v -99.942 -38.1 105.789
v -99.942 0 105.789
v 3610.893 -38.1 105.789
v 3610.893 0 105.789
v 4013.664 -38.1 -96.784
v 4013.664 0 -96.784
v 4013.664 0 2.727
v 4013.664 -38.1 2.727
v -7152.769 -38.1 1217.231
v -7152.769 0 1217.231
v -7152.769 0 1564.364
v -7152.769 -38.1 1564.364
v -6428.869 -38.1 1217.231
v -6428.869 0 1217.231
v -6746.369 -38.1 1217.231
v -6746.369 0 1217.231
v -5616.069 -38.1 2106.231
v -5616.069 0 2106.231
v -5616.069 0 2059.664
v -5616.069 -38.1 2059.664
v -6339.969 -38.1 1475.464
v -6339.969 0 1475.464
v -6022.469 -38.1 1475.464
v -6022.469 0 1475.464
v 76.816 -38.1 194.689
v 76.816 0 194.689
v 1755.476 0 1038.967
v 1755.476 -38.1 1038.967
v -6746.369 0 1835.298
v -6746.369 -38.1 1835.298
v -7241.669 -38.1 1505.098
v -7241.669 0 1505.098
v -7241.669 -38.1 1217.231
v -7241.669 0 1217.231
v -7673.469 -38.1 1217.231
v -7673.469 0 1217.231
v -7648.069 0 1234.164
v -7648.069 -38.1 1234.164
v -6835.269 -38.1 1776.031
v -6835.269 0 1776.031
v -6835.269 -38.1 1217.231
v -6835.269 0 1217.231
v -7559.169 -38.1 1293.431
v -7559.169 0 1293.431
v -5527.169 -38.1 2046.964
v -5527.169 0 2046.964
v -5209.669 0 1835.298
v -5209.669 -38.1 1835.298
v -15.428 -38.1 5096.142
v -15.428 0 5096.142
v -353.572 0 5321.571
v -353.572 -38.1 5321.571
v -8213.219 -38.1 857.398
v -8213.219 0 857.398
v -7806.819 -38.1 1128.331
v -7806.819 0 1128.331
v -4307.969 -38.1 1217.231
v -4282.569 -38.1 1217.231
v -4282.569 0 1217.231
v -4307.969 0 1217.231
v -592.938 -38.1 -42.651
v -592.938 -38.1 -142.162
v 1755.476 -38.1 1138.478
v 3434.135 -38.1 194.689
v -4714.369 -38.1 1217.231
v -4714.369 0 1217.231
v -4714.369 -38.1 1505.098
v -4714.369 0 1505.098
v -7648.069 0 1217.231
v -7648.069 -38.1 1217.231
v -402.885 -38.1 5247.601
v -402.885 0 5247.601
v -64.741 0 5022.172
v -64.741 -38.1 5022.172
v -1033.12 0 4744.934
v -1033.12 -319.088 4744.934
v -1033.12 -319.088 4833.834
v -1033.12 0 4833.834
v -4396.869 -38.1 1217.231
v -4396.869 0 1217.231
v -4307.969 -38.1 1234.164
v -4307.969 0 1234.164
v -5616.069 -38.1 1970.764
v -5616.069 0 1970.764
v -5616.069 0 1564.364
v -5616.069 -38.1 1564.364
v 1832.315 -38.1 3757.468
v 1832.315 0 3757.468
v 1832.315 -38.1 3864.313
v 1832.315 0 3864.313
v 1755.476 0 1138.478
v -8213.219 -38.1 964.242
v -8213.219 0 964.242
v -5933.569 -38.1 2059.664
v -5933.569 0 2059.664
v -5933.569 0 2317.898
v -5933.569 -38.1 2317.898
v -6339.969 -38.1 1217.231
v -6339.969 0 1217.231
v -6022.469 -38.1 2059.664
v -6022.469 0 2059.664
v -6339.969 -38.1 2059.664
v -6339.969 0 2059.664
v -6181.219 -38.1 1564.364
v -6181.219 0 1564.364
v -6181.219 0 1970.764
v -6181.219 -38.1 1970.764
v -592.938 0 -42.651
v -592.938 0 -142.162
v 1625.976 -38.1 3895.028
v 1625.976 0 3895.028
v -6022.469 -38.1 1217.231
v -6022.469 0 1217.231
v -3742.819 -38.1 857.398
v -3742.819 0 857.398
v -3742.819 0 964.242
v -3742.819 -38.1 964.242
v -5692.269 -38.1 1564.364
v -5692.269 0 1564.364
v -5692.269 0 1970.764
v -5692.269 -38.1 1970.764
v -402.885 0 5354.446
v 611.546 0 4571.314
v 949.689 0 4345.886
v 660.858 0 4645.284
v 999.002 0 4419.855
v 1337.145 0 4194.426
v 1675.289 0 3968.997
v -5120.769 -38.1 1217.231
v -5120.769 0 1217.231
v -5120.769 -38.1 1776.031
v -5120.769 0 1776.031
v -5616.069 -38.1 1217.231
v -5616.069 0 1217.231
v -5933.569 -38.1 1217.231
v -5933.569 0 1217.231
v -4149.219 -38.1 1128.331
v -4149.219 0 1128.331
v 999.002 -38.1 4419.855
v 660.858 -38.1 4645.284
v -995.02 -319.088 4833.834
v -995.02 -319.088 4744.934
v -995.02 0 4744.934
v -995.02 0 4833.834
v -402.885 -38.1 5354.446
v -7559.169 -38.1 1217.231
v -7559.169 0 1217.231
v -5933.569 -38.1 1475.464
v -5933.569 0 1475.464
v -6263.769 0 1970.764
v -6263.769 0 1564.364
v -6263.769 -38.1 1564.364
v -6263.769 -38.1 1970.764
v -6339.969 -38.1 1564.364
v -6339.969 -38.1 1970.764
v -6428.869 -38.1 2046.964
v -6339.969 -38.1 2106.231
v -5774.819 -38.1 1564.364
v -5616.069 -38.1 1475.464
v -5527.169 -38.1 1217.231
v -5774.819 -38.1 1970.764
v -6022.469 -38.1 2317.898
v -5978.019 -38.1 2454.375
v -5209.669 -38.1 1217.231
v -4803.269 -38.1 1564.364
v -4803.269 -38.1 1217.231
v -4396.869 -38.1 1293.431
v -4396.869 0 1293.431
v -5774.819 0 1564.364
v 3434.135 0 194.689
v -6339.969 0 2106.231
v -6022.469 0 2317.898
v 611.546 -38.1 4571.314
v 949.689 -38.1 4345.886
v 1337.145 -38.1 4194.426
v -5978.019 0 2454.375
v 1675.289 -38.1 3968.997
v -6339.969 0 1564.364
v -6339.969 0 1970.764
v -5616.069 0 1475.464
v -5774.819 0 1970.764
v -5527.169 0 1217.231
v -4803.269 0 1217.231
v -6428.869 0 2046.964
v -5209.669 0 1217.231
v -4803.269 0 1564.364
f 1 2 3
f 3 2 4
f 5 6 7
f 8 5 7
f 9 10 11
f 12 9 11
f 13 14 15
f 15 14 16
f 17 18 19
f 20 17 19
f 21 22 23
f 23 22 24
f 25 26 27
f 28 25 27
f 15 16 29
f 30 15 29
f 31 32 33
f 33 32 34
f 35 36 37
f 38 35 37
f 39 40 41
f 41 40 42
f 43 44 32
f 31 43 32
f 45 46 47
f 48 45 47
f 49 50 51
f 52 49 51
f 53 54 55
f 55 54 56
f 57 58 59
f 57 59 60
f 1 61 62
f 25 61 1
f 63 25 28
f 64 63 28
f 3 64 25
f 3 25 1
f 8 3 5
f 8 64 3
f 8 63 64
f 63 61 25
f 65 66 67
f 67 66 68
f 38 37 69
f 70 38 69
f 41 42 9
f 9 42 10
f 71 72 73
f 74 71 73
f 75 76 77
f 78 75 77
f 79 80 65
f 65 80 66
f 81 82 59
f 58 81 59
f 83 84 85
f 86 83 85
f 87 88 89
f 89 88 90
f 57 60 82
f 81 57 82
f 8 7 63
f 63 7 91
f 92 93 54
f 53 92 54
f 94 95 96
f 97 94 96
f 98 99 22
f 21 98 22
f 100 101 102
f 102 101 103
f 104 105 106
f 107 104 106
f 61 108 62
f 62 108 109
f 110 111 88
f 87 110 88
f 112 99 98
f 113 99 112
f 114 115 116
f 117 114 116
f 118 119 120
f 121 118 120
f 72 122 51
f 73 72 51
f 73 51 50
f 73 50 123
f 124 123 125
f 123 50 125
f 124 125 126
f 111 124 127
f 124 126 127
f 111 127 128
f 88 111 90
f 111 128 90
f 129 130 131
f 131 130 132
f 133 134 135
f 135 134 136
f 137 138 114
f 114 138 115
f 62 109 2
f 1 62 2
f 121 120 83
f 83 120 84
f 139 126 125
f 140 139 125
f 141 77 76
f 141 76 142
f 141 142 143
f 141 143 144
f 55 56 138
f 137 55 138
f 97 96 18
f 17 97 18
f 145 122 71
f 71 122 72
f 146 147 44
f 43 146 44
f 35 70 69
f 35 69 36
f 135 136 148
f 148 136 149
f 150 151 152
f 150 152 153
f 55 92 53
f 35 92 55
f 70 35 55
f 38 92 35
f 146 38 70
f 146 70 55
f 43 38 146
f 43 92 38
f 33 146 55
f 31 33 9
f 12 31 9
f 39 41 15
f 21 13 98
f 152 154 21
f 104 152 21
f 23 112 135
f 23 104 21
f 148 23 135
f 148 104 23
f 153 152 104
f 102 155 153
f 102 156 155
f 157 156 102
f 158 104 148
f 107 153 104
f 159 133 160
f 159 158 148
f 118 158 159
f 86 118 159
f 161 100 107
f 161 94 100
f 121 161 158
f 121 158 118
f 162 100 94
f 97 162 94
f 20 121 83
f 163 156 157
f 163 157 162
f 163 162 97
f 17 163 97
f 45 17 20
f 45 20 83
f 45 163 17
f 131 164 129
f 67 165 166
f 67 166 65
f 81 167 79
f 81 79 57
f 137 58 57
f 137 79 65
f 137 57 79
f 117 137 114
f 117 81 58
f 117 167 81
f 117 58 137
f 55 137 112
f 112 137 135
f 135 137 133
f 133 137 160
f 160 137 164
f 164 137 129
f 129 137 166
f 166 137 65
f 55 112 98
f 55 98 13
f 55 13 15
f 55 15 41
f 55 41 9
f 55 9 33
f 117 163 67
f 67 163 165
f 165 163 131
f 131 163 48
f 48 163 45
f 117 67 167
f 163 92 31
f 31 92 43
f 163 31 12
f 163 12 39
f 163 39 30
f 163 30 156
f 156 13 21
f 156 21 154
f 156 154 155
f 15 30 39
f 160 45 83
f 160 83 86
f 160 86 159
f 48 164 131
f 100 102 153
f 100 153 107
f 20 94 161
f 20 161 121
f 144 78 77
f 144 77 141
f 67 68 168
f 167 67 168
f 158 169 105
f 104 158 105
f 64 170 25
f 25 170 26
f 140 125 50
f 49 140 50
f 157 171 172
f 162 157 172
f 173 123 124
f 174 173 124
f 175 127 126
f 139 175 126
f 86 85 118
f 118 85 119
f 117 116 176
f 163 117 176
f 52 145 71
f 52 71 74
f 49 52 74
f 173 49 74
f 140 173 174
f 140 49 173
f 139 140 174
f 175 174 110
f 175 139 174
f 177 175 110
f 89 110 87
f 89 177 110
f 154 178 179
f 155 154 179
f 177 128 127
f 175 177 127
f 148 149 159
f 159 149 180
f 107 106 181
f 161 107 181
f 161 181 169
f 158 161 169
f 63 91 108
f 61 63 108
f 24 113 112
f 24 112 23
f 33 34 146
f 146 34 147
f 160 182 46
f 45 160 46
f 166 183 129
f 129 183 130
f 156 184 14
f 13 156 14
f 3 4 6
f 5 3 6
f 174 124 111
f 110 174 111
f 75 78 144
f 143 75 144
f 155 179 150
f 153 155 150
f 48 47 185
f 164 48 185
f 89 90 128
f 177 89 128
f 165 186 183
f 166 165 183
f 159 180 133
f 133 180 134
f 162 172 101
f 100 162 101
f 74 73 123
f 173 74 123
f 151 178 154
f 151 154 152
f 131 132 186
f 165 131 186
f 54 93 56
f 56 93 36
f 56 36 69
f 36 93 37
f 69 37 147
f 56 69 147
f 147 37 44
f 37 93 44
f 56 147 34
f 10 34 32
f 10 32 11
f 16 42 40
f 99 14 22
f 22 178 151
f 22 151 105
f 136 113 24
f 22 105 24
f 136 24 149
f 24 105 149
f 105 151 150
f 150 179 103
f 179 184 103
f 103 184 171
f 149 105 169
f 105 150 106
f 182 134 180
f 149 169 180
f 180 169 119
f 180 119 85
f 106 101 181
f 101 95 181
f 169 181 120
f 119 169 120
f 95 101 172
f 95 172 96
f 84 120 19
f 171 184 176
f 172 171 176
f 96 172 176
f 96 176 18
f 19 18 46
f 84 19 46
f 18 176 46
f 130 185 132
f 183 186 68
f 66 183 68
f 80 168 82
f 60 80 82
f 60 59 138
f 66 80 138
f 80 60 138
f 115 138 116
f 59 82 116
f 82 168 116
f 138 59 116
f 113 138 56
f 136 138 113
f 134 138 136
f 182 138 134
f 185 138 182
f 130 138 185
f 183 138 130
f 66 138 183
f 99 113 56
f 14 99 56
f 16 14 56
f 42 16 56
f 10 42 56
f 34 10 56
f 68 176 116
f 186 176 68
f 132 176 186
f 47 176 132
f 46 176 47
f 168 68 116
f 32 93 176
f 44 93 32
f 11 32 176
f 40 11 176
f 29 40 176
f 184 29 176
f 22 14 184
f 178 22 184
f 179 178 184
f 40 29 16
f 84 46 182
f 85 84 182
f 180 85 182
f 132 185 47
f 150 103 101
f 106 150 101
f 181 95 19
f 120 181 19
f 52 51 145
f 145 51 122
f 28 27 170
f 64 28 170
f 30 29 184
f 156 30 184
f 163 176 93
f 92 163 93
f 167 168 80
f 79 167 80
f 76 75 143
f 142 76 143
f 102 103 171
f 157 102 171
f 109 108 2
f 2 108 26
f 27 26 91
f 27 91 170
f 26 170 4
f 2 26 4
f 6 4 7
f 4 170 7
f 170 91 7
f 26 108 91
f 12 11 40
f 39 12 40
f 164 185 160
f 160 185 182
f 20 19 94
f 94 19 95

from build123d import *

# Parameters (mm, degrees)
F1_DEPTH = 38.1
F2_W     = 317.5
F2_H     = 258.233333
F2_W_2   = 76.2
F2_H_2   = 406.4
F3_DEPTH = 38.1
F5_W     = 38.1
F5_H     = 88.9
F6_DEPTH = 319.0875
F7_DEPTH = 38.1


with BuildPart() as f1:
    # F0 (on Front) → F1 (new body)
    with BuildSketch(Plane.XZ):
        Polygon((-592.93803, -142.161947), (-99.942244, 105.789102), (3610.893464, 105.789102), (4013.664407, -96.783578), (4013.664407, 2.727108), (1755.47561, 1138.477752), (-592.93803, -42.65126), align=None)
        Polygon((3434.135489, 194.689102), (1738.685489, 194.689102), (76.815731, 194.689102), (1755.47561, 1038.967065), align=None, mode=Mode.SUBTRACT)
    extrude(amount=F1_DEPTH)


with BuildPart() as f3:
    # F2 (on Front) → F3 (new body)
    with BuildSketch(Plane.XZ):
        Polygon((-8213.219005, 857.397658), (-7806.819005, 1128.330991), (-4149.219005, 1128.330991), (-3742.819005, 857.397658), (-3742.819005, 964.24216), (-5978.019005, 2454.375494), (-8213.219005, 964.24216), align=None)
        Polygon((-7648.069005, 1234.164324), (-7648.069005, 1217.230991), (-7673.469005, 1217.230991), align=None, mode=Mode.SUBTRACT)
        Polygon((-7241.669005, 1505.097658), (-7241.669005, 1217.230991), (-7559.169005, 1217.230991), (-7559.169005, 1293.430991), align=None, mode=Mode.SUBTRACT)
        with Locations((-6181.219005, 1346.347657)):
            Rectangle(F2_W, F2_H, mode=Mode.SUBTRACT)
        Polygon((-6835.269005, 1776.030991), (-6835.269005, 1217.230991), (-7152.769005, 1217.230991), (-7152.769005, 1564.364324), align=None, mode=Mode.SUBTRACT)
        Polygon((-6428.869005, 2046.964324), (-6428.869005, 1217.230991), (-6746.369005, 1217.230991), (-6746.369005, 1835.297658), align=None, mode=Mode.SUBTRACT)
        Polygon((-4282.569005, 1217.230991), (-4307.969005, 1217.230991), (-4307.969005, 1234.164324), align=None, mode=Mode.SUBTRACT)
        Polygon((-5908.169005, 1217.230991), (-5933.569005, 1217.230991), (-5933.569005, 1475.464324), (-5616.069005, 1475.464324), (-5616.069005, 1217.230991), align=None, mode=Mode.SUBTRACT)
        Polygon((-5095.369005, 1217.230991), (-5120.769005, 1217.230991), (-5120.769005, 1776.030991), (-4803.269005, 1564.364324), (-4803.269005, 1217.230991), align=None, mode=Mode.SUBTRACT)
        Polygon((-5501.769005, 1217.230991), (-5527.169005, 1217.230991), (-5527.169005, 2046.964324), (-5209.669005, 1835.297658), (-5209.669005, 1217.230991), align=None, mode=Mode.SUBTRACT)
        Polygon((-4688.969005, 1217.230991), (-4714.369005, 1217.230991), (-4714.369005, 1505.097658), (-4396.869005, 1293.430991), (-4396.869005, 1217.230991), align=None, mode=Mode.SUBTRACT)
        with Locations((-6301.869005, 1767.564324)):
            Rectangle(F2_W_2, F2_H_2, mode=Mode.SUBTRACT)
        Polygon((-6022.469005, 2317.897658), (-6022.469005, 2059.664324), (-6339.969005, 2059.664324), (-6339.969005, 2106.230991), align=None, mode=Mode.SUBTRACT)
        Polygon((-5774.819005, 1564.364324), (-5781.169005, 1564.364324), (-6174.869005, 1564.364324), (-6181.219005, 1564.364324), (-6181.219005, 1970.764324), (-5774.819005, 1970.764324), align=None, mode=Mode.SUBTRACT)
        Polygon((-5692.269005, 1970.764324), (-5616.069005, 1970.764324), (-5616.069005, 1767.564324), (-5616.069005, 1564.364324), (-5692.269005, 1564.364324), align=None, mode=Mode.SUBTRACT)
        Polygon((-5616.069005, 2106.230991), (-5616.069005, 2059.664324), (-5933.569005, 2059.664324), (-5933.569005, 2317.897658), align=None, mode=Mode.SUBTRACT)
    extrude(amount=F3_DEPTH)


with BuildPart() as f6:
    # F5 (on Front) → F6 (new body)
    with BuildSketch(Plane.XZ):
        with Locations((-1014.070092, 4789.384082)):
            Rectangle(F5_W, F5_H)
    extrude(amount=F6_DEPTH)


with BuildPart() as f7:
    # F4 (on Front) → F7 (new body)
    with BuildSketch(Plane.XZ):
        Polygon((1625.975857, 3895.027677), (1832.31463, 3757.468494), (1832.31463, 3864.312997), (1675.288704, 3968.996948), align=None)
        Polygon((1287.832451, 4120.456614), (1625.975857, 3895.027677), (1675.288704, 3968.996948), (1337.145299, 4194.425885), align=None)
        Polygon((949.689045, 4345.885551), (1287.832451, 4120.456614), (1337.145299, 4194.425885), (999.001893, 4419.854822), align=None)
        Polygon((611.545639, 4571.314489), (949.689045, 4345.885551), (999.001893, 4419.854822), (660.858487, 4645.28376), align=None)
        Polygon((273.402233, 4796.743426), (611.545639, 4571.314489), (660.858487, 4645.28376), (322.715081, 4870.712697), align=None)
        Polygon((-64.741173, 5022.172363), (273.402233, 4796.743426), (322.715081, 4870.712697), (-15.428325, 5096.141634), align=None)
        Polygon((-402.884579, 5247.601301), (-64.741173, 5022.172363), (-15.428325, 5096.141634), (-353.571731, 5321.570572), align=None)
        Polygon((-402.884579, 5354.445803), (-402.884579, 5247.601301), (-353.571731, 5321.570572), align=None)
    extrude(amount=F7_DEPTH)


solid = Compound([f1.part, f3.part, f6.part, f7.part])
